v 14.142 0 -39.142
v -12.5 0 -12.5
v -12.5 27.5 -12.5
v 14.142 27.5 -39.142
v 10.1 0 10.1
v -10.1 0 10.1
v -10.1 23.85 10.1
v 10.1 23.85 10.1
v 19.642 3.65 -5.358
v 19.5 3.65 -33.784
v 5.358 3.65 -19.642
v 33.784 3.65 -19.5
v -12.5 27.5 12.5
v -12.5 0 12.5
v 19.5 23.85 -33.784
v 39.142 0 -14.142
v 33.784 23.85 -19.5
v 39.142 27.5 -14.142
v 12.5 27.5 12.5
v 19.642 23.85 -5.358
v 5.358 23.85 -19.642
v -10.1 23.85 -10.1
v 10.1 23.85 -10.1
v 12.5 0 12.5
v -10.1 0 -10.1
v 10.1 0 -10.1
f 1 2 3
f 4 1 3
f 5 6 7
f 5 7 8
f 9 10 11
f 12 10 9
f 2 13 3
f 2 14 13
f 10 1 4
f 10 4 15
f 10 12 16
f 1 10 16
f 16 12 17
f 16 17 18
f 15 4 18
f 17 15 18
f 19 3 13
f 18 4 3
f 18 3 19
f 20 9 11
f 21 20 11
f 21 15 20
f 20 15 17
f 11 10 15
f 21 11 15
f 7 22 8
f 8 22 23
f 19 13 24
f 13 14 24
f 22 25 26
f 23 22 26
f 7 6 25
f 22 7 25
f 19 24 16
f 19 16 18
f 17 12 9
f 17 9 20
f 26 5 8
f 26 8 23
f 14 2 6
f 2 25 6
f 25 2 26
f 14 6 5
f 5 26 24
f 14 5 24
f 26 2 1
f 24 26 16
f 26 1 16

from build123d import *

# Parameters (mm, degrees)
SKETCH_1_W           = 25
SKETCH_1_H           = 25
SKETCH_1_W_2         = 20.2
SKETCH_1_H_2         = 20.2
EXTRUDE_1_DEPTH      = 20
SKETCH_2_W           = 25
SKETCH_2_H           = 25
EXTRUDE_2_DEPTH      = 7.5
EXTRUDE_3_DEPTH      = 17.67767
EXTRUDE_3_DEPTH_BACK = 20
SKETCH_3_W           = 35.35533906
SKETCH_3_H           = 27.5
SKETCH_3_W_2         = 20.2
SKETCH_3_H_2         = 20.2
SKETCH_1_3_W         = 20.2
SKETCH_1_3_H         = 20.2
CUT_EXTRUDE_1_DEPTH  = 23.85
SKETCH_3_2_W         = 20.2
SKETCH_3_2_H         = 20.2
CUT_EXTRUDE_2_DEPTH  = 20
EXTRUDE_4_REACH      = 62.275


with BuildPart() as part:
    # 스케치1 → 보스-돌출1 (new body)
    with BuildSketch(Plane(origin=(0, 0, 0), x_dir=(1, 0, 0), z_dir=(0, 1, 0))):
        Rectangle(SKETCH_1_W, SKETCH_1_H)
        Rectangle(SKETCH_1_W_2, SKETCH_1_H_2, mode=Mode.SUBTRACT)
    extrude(amount=EXTRUDE_1_DEPTH)

    # 스케치2 → 보스-돌출2 (add)
    with BuildSketch(Plane(origin=(0, 20, 0), x_dir=(1, 0, 0), z_dir=(0, 1, 0))):
        Rectangle(SKETCH_2_W, SKETCH_2_H)
    extrude(amount=EXTRUDE_2_DEPTH)

    # 스케치3 → 보스-돌출3 (add, two sides: drawn at the far end of the back side and taken through both)
    with BuildSketch(Plane(origin=(12.5, 0, -12.5), x_dir=(0.7071067811865476, 0, 0.7071067811865476), z_dir=(-0.7071067811865476, 0, 0.7071067811865476)).offset(-EXTRUDE_3_DEPTH_BACK)):
        with Locations((0, 13.75)):
            Rectangle(SKETCH_3_W, SKETCH_3_H)
        with Locations((0, 13.75)):
            Rectangle(SKETCH_3_W_2, SKETCH_3_H_2, mode=Mode.SUBTRACT)
    extrude(amount=EXTRUDE_3_DEPTH + EXTRUDE_3_DEPTH_BACK)

    # 스케치1<3> → 컷-돌출1 (cut)
    with BuildSketch(Plane(origin=(0, 0, 0), x_dir=(1, 0, 0), z_dir=(0, 1, 0))):
        Rectangle(SKETCH_1_3_W, SKETCH_1_3_H)
    extrude(amount=CUT_EXTRUDE_1_DEPTH, mode=Mode.SUBTRACT)

    # 스케치3<2> → 컷-돌출2 (cut)
    with BuildSketch(Plane(origin=(12.5, 0, -12.5), x_dir=(0.7071067811865476, 0, 0.7071067811865476), z_dir=(-0.7071067811865476, 0, 0.7071067811865476))):
        with Locations((0, 13.75)):
            Rectangle(SKETCH_3_2_W, SKETCH_3_2_H)
    extrude(amount=CUT_EXTRUDE_2_DEPTH, mode=Mode.SUBTRACT)

    # 스케치5 → 보스-돌출4 (add, up to next)
    with BuildSketch(Plane(origin=(0, 3.65, 0), x_dir=(1, 0, 0), z_dir=(0, 1, 0)), mode=Mode.PRIVATE) as extrude_4_sk1:
        Polygon((19.64177849, 5.35822151), (5.35822151, 19.64177849), (-4.18355698, 10.1), (10.1, 10.1), (10.1, -4.18355698), align=None)
    extrude_4_tool1 = extrude(extrude_4_sk1.sketch, amount=EXTRUDE_4_REACH, mode=Mode.PRIVATE) - part.part
    add(extrude_4_tool1.solids().sort_by_distance((12.261747, 3.65, -12.261747))[0])


solid = part.part
